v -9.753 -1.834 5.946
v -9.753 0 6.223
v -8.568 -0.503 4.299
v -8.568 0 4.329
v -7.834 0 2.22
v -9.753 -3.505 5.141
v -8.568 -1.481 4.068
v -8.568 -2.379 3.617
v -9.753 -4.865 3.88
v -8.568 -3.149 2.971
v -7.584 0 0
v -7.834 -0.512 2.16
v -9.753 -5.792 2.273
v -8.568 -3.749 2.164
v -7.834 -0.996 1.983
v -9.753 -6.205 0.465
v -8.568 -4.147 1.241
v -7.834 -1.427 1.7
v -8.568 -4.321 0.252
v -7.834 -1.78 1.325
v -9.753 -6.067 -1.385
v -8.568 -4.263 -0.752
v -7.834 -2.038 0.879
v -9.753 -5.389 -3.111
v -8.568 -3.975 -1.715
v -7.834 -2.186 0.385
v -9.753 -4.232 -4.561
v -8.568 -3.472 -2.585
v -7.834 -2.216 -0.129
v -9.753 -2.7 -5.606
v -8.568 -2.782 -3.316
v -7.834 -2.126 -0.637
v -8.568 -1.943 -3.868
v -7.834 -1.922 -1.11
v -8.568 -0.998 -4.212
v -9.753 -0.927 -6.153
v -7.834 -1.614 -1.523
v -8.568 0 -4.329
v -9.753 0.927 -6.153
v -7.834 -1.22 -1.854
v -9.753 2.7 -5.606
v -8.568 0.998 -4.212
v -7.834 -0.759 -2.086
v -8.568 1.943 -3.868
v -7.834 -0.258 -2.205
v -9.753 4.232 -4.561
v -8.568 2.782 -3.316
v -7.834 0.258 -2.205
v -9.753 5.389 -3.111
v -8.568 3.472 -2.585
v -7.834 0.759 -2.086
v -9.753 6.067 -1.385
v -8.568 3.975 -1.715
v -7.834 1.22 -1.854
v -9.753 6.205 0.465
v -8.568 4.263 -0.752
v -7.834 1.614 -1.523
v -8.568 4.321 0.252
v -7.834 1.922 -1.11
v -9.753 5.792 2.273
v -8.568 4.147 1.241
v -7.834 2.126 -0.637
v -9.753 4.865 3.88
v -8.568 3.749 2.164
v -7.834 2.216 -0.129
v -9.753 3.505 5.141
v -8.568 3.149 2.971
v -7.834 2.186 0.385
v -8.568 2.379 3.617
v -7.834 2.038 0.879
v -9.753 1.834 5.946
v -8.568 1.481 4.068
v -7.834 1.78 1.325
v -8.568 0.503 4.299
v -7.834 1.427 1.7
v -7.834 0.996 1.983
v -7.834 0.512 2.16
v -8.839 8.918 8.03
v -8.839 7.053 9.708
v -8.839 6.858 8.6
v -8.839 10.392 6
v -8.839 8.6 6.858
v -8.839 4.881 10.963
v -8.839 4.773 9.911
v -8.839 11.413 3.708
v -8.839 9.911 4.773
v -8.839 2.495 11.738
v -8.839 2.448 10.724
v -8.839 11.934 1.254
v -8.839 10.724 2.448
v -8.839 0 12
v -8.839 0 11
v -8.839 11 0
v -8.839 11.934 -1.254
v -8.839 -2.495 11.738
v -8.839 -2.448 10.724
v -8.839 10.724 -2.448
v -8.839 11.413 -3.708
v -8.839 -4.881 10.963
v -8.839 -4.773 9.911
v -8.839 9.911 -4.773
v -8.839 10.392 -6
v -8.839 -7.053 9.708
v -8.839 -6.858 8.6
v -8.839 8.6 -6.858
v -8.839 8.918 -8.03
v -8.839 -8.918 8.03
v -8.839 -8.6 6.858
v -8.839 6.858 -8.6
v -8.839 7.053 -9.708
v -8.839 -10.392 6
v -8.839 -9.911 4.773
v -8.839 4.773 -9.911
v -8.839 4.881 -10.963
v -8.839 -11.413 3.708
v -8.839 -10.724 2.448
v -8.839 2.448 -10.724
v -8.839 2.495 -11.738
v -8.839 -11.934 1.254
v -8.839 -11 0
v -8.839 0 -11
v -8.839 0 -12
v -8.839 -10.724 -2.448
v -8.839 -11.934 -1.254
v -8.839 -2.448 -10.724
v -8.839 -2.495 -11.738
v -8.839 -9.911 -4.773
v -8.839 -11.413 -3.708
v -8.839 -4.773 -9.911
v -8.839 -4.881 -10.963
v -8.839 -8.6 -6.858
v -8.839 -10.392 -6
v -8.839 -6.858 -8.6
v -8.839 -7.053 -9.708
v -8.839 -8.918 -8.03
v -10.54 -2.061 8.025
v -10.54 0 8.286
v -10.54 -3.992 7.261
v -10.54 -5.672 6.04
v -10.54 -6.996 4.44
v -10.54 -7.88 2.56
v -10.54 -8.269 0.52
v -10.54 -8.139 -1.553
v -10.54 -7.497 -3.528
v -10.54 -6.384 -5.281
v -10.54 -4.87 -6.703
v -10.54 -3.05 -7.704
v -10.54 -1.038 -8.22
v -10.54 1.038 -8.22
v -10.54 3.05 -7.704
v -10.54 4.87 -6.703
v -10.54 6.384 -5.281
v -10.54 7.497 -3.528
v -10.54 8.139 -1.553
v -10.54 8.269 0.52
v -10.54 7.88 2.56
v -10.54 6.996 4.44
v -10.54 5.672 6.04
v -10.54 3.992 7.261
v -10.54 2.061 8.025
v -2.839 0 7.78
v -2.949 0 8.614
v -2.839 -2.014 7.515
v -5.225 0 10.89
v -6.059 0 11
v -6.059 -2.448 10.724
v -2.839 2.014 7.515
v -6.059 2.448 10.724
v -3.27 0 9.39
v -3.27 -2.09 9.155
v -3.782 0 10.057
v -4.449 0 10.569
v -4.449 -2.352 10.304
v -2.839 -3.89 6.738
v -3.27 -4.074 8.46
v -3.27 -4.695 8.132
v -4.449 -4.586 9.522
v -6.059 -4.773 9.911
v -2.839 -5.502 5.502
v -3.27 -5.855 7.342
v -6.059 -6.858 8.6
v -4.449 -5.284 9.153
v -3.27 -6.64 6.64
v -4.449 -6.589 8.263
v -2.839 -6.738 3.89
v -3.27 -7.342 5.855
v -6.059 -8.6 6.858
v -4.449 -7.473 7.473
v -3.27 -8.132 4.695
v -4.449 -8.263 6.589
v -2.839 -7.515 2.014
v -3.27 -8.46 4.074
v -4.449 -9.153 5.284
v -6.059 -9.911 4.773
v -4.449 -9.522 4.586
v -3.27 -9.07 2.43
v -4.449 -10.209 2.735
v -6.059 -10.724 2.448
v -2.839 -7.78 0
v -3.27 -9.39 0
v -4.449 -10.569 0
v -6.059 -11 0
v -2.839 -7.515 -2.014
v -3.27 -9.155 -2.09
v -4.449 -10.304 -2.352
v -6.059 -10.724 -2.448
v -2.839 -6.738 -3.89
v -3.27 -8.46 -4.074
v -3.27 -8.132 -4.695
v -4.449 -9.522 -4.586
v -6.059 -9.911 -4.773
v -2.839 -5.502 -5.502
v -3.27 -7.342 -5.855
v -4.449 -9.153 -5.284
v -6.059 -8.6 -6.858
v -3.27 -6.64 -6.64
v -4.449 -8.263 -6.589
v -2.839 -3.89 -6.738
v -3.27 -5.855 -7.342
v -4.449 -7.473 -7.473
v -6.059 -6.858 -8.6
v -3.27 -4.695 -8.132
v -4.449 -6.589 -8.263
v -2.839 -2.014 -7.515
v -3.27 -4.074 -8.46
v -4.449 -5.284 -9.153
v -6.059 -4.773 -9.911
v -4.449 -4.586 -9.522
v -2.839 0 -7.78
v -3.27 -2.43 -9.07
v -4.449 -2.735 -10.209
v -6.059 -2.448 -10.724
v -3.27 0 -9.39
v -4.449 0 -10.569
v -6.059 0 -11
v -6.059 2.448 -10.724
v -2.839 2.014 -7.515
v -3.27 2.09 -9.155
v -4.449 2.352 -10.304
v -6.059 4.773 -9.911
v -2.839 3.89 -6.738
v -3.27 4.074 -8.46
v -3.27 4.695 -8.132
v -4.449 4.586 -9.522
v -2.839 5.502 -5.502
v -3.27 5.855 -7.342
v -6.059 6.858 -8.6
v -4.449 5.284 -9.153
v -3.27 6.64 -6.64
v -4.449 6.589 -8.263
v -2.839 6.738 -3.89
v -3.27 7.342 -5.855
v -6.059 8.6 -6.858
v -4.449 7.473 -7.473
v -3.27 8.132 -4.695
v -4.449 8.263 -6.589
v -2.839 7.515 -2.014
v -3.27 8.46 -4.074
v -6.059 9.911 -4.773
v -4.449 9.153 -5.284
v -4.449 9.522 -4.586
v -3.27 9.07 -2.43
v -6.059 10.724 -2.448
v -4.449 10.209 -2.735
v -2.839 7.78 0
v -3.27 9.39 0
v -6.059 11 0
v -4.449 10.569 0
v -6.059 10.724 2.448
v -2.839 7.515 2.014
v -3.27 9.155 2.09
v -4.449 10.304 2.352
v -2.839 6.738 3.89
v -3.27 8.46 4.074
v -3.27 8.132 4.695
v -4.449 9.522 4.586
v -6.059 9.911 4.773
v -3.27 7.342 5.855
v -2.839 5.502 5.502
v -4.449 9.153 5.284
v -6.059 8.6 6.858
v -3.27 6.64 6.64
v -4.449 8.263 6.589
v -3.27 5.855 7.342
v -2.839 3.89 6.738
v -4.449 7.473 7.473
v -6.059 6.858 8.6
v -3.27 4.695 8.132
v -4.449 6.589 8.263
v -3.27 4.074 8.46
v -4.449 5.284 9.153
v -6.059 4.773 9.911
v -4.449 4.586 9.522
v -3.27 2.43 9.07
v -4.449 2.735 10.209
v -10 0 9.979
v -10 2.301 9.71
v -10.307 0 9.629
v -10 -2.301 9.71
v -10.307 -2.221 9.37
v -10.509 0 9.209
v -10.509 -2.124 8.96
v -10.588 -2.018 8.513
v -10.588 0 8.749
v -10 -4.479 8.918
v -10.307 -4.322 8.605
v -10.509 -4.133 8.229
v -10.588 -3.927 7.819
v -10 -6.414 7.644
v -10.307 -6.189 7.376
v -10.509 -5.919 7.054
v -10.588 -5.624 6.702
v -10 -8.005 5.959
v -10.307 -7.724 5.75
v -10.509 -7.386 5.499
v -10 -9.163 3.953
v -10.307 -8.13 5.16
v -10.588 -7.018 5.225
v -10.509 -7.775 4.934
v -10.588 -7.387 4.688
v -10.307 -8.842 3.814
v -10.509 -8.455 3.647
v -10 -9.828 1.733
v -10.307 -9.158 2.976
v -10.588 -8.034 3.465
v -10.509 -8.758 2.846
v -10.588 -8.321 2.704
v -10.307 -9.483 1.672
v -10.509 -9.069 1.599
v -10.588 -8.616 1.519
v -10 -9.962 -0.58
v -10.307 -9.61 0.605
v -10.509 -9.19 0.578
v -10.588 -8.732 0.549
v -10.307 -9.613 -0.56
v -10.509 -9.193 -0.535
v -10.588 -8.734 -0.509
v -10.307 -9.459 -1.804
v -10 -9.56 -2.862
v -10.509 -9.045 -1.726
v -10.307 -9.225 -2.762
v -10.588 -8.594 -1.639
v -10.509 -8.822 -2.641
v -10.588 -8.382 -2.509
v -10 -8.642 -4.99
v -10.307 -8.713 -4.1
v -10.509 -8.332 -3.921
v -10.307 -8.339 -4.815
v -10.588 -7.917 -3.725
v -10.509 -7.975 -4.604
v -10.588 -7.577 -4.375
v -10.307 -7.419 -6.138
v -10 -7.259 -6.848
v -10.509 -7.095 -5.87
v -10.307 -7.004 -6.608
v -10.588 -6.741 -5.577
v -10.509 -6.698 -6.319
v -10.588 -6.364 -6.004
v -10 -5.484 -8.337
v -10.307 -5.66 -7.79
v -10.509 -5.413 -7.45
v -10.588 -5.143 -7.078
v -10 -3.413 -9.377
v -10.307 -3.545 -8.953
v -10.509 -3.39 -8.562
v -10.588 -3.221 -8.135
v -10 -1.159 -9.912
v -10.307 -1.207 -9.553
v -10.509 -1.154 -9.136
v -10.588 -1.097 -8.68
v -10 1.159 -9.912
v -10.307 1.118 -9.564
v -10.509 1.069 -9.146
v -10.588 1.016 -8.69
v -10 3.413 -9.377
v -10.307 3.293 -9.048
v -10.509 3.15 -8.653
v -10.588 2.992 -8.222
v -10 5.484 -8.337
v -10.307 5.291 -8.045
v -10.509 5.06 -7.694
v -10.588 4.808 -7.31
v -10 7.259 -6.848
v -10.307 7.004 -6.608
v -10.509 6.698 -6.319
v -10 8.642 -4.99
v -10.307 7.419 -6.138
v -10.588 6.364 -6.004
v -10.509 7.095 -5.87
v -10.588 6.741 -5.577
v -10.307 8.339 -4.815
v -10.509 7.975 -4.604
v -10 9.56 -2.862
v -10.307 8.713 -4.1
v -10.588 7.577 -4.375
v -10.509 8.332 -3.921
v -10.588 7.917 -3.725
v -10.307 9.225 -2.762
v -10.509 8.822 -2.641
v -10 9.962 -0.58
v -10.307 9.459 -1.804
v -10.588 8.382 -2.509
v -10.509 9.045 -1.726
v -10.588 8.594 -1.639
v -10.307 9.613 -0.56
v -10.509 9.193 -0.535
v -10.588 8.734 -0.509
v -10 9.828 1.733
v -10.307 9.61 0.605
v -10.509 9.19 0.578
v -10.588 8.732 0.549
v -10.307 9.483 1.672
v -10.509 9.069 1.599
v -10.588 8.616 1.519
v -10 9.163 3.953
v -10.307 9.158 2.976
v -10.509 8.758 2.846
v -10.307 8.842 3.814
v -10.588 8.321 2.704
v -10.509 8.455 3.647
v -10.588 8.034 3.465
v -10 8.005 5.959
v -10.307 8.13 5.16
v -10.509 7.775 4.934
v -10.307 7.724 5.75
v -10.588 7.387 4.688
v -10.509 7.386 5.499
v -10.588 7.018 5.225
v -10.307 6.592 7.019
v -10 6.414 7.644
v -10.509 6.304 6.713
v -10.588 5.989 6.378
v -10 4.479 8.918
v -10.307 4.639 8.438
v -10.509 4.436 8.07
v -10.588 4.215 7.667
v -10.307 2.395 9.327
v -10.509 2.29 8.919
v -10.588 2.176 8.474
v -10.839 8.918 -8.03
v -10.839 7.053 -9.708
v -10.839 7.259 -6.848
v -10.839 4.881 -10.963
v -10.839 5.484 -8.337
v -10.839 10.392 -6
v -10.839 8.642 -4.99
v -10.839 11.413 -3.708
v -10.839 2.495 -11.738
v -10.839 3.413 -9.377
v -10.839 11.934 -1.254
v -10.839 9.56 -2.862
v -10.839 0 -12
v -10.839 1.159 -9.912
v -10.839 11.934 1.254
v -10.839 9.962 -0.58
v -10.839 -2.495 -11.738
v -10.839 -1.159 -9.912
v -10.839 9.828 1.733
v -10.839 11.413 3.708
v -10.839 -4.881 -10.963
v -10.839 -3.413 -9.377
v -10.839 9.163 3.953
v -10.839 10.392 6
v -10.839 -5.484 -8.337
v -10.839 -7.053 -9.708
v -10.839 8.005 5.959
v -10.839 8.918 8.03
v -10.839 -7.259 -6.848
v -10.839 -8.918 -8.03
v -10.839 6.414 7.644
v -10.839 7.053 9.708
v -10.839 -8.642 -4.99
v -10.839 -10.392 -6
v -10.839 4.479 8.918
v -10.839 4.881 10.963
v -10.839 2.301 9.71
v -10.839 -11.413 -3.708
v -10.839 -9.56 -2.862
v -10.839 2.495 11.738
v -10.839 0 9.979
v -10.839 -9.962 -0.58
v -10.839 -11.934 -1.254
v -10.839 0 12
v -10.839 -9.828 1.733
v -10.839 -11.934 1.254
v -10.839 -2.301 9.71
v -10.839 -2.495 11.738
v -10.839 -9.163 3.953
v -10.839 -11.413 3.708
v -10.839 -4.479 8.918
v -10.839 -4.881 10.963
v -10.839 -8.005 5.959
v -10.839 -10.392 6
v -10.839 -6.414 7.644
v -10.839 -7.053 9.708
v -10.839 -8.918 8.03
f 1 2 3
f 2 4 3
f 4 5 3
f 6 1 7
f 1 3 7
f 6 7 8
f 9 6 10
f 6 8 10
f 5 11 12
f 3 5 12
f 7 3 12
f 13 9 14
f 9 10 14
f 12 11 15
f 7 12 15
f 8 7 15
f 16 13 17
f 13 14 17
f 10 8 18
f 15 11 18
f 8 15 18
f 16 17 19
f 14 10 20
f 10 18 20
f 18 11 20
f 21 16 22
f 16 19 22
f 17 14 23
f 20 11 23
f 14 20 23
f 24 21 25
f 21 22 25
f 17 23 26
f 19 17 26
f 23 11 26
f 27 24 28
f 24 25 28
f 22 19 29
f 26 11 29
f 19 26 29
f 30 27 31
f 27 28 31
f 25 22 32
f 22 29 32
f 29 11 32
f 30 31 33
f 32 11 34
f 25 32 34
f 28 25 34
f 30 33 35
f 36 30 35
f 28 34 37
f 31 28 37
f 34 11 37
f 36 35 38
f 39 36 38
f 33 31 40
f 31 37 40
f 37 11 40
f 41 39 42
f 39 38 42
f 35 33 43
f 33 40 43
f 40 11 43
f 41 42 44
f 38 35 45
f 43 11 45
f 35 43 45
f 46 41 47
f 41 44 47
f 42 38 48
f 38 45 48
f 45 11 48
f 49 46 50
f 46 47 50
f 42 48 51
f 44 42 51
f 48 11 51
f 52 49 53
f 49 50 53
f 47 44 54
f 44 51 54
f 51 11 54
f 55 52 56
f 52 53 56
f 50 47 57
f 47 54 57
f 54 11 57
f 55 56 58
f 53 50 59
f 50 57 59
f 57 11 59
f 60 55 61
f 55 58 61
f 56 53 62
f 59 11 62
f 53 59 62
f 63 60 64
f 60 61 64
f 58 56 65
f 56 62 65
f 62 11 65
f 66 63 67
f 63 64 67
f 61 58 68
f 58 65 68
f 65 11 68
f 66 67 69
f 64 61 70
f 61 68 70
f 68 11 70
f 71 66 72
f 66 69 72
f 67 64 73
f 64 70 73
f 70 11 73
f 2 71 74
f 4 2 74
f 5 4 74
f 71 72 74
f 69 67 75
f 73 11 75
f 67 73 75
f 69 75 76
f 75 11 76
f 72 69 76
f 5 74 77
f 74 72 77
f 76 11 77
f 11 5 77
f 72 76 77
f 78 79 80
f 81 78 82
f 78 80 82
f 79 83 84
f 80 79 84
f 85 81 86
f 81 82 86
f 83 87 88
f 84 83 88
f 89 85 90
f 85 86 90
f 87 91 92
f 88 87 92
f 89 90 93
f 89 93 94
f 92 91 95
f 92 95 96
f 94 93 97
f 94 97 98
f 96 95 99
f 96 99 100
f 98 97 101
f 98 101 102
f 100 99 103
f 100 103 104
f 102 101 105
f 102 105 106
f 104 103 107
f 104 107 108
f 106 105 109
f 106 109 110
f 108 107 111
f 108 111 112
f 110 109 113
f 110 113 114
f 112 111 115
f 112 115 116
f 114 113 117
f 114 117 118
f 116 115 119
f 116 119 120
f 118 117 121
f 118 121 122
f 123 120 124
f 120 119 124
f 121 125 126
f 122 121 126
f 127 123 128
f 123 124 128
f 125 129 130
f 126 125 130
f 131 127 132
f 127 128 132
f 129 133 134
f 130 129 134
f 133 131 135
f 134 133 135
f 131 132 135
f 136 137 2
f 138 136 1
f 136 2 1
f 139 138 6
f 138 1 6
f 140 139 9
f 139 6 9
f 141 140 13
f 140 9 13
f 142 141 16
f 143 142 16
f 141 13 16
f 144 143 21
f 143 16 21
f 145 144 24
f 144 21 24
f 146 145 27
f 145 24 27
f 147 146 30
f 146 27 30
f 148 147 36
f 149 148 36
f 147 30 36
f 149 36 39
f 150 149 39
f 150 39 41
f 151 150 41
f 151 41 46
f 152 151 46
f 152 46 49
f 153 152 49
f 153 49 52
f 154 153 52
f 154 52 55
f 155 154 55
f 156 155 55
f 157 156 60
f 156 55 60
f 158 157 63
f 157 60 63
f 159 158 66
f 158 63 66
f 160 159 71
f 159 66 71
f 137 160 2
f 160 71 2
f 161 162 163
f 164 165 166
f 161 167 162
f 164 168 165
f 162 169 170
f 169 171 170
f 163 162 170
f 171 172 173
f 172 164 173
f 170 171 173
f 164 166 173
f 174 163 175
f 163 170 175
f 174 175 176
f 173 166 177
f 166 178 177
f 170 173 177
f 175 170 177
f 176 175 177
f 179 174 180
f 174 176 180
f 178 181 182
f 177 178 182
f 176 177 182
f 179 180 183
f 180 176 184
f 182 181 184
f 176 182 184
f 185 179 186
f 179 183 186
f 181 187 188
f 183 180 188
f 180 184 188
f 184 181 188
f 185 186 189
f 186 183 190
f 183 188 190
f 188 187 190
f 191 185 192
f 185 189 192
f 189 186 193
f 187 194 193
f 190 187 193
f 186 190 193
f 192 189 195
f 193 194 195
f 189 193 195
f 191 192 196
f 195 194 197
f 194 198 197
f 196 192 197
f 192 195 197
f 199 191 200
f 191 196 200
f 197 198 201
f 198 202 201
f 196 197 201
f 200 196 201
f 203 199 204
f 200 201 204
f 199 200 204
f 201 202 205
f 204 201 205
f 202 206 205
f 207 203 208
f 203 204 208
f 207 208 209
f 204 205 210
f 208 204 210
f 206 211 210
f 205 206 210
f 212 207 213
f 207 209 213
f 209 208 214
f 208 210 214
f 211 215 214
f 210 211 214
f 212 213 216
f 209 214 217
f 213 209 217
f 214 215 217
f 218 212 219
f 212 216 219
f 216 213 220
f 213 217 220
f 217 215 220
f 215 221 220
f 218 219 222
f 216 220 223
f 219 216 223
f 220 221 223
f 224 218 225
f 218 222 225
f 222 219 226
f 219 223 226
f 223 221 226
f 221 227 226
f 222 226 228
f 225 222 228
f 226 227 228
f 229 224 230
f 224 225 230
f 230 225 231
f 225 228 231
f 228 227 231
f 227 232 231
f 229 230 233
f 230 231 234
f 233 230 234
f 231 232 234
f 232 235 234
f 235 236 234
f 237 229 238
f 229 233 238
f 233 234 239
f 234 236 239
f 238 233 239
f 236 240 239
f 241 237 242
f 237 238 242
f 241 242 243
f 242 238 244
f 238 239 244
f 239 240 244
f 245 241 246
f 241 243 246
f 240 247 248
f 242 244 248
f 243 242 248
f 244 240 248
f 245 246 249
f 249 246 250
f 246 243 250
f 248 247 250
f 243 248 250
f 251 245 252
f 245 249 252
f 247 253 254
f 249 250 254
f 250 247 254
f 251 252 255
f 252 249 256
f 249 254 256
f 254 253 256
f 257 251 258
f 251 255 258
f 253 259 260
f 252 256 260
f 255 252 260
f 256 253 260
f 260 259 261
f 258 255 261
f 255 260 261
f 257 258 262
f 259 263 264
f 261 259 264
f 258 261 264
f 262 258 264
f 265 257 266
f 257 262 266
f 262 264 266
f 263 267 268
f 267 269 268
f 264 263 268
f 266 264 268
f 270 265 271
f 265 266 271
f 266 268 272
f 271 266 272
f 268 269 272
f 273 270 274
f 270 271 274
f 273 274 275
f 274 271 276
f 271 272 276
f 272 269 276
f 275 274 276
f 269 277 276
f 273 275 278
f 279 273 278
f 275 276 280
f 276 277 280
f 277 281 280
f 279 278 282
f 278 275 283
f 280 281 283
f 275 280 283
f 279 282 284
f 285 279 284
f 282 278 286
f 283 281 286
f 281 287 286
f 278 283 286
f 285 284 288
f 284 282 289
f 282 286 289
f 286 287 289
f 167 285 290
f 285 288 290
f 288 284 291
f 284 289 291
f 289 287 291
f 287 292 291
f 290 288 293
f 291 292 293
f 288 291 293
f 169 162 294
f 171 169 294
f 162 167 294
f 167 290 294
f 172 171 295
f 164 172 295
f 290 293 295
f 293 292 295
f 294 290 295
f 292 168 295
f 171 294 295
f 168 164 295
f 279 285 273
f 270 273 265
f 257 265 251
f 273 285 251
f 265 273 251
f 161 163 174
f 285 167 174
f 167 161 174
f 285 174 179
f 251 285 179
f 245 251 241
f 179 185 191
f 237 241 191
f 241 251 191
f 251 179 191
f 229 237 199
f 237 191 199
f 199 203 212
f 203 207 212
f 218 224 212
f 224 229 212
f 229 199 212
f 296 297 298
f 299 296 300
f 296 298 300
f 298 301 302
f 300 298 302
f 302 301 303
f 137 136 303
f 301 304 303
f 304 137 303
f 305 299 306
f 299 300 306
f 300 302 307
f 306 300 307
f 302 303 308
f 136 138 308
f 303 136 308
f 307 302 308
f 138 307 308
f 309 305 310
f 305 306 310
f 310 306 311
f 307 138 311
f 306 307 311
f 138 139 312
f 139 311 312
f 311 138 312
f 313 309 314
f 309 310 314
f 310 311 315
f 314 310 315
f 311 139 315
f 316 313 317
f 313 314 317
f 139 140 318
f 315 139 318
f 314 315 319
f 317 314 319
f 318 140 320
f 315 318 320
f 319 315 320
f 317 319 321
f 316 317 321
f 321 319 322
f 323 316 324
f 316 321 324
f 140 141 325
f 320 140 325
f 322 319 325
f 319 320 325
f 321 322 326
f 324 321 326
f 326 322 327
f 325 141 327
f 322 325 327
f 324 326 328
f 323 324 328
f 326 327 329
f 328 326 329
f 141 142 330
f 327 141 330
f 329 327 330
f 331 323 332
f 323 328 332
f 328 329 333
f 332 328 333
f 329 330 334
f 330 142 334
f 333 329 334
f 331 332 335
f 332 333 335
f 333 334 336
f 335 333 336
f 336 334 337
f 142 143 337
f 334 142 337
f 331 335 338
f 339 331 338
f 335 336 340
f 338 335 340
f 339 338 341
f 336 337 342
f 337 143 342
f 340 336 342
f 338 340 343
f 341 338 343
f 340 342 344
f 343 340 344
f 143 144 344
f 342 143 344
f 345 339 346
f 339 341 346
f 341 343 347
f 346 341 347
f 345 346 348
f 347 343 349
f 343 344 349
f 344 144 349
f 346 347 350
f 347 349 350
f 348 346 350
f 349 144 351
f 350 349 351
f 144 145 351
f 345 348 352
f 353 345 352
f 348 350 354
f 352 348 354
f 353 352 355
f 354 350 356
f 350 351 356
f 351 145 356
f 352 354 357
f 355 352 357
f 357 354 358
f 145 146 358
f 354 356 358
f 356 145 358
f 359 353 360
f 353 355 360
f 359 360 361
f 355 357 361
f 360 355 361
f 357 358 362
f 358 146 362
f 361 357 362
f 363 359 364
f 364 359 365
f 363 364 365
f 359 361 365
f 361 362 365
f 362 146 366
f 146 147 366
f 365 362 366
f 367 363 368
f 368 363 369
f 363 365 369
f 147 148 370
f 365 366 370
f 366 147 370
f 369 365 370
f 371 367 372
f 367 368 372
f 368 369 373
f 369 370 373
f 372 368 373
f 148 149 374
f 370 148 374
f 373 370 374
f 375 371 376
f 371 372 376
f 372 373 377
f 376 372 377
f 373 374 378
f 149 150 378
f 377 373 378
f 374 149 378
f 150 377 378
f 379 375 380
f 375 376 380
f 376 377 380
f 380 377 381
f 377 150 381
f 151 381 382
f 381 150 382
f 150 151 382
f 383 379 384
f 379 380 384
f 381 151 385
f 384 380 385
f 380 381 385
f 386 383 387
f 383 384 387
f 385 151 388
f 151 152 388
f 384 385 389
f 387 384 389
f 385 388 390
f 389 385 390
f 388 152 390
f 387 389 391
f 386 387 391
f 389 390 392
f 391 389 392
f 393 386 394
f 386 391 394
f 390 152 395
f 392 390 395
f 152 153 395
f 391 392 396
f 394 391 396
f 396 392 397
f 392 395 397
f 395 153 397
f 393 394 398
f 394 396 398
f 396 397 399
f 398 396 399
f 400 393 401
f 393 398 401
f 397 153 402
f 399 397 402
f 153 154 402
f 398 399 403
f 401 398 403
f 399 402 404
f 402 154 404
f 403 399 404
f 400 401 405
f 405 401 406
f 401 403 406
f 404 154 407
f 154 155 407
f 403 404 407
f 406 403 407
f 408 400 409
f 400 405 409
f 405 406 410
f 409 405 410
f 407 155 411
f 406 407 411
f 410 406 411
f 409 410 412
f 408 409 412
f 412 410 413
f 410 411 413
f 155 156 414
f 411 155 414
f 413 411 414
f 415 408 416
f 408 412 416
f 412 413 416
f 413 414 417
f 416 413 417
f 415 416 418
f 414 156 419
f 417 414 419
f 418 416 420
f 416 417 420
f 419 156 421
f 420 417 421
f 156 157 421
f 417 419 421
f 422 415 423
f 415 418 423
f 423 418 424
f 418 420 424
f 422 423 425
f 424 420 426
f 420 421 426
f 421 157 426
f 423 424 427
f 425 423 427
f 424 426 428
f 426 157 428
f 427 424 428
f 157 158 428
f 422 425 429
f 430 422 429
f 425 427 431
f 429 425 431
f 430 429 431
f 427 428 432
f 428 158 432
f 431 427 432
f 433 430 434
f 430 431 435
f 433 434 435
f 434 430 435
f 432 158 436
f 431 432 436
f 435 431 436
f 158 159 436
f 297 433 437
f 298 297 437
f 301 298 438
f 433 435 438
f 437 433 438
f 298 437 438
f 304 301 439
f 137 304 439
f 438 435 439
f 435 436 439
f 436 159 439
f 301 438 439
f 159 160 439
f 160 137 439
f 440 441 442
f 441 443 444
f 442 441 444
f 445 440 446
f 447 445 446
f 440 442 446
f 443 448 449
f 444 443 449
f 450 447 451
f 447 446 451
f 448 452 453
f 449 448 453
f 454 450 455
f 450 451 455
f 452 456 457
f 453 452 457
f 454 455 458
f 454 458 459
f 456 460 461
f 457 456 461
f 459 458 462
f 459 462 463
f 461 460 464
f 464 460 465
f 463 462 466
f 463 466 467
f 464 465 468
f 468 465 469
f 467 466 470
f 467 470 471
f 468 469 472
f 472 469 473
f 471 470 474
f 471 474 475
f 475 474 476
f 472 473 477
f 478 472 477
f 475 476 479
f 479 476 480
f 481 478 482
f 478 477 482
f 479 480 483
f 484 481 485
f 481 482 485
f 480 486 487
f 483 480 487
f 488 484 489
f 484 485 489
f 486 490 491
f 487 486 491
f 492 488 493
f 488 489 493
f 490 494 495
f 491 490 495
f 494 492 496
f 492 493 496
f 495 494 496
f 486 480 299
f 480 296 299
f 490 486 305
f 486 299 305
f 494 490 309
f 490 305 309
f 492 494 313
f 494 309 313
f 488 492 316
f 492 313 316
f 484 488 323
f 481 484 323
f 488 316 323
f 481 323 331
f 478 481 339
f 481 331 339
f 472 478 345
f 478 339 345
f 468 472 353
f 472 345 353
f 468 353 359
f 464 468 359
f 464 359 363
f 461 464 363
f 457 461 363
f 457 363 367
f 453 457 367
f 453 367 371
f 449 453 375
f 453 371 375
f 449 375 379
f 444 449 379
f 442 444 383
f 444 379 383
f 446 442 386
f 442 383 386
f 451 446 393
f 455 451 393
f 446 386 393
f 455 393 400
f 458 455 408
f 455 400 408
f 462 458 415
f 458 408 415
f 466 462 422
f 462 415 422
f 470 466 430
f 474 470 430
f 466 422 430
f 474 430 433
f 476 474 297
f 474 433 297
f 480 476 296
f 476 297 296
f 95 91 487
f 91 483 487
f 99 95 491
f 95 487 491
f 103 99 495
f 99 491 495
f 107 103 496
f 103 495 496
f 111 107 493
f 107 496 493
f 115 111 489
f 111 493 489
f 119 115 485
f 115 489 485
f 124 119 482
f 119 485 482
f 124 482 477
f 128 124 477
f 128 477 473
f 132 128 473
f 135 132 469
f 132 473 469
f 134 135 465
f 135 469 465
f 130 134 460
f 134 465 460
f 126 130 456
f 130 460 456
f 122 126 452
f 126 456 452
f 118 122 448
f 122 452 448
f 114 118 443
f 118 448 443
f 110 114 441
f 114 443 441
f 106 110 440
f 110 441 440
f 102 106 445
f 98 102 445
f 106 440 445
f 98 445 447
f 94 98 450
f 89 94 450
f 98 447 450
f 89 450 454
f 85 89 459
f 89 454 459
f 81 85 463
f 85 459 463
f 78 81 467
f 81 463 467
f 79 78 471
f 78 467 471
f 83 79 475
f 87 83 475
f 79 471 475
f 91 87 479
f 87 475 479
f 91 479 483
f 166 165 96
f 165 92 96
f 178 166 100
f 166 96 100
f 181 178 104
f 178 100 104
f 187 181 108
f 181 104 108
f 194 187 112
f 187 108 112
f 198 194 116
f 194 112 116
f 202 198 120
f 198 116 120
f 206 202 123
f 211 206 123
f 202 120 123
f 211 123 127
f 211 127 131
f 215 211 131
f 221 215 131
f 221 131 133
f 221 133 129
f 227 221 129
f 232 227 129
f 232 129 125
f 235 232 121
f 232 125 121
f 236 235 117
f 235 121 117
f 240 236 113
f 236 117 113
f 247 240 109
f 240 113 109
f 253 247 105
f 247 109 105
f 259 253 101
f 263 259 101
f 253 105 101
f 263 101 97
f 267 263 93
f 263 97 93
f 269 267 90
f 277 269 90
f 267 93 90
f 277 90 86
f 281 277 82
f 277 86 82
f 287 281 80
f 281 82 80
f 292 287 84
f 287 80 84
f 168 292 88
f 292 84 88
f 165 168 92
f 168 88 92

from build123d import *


with BuildPart() as part:
    # Sketch1 → Revolve1 (revolve)
    with BuildSketch(Plane(origin=(0, 0, 0), x_dir=(1, 0, 0), z_dir=(0, 1, 0)), mode=Mode.PRIVATE) as revolve1_sk:
        with BuildLine():
            Line((-10.83902439, 12), (-10.83902439, 9.979177887))
            Line((-10.83902439, 9.979177887), (-9.99958636, 9.979177887))
            ThreePointArc((-9.99958636, 9.979177887), (-10.508608574, 9.208564683), (-10.540029762, 8.285547331))
            Line((-10.540029762, 8.285547331), (-9.752554563, 6.222546257))
            ThreePointArc((-9.752554563, 6.222546257), (-8.141995388, 3.29472213), (-7.584446232, 0))
            Line((-7.584446232, 0), (-2.83902439, 0))
            Line((-2.83902439, 0), (-2.83902439, 7.780487805))
            ThreePointArc((-2.83902439, 7.780487805), (-3.78199768, 10.05702671), (-6.058536585, 11))
            Line((-6.058536585, 11), (-8.83902439, 11))
            Line((-8.83902439, 11), (-8.83902439, 12))
            Line((-8.83902439, 12), (-10.83902439, 12))
        make_face()
    revolve(revolve1_sk.sketch.rotate(Axis((0, 0, 0), (1, 0, 0)), 180), axis=Axis((0, 0, 0), (1, 0, 0)))


solid = part.part
